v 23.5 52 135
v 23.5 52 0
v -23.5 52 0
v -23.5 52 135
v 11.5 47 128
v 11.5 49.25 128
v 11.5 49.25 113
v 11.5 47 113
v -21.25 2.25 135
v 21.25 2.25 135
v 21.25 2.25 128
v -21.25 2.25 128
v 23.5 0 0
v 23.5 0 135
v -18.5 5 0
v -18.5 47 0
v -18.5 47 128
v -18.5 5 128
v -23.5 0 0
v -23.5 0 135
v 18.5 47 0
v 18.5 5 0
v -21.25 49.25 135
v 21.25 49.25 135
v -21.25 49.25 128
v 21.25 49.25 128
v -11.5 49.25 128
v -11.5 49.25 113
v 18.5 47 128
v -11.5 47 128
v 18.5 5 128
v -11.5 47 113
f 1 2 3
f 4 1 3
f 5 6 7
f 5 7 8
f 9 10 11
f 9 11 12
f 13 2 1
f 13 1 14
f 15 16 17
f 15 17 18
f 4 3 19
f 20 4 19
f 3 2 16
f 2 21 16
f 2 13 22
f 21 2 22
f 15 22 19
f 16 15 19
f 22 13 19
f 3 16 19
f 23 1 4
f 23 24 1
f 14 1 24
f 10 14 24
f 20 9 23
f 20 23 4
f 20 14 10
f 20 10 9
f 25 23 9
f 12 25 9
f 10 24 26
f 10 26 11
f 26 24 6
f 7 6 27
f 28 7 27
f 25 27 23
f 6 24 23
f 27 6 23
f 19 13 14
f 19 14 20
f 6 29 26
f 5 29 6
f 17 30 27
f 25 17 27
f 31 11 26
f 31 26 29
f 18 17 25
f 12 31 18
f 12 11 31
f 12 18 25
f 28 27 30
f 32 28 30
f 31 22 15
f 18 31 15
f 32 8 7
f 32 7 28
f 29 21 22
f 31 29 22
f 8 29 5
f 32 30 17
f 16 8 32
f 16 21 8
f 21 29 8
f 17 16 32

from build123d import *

# Parameters (mm, degrees)
SKETCH119_W             = 47
SKETCH119_H             = 52
SKETCH119_W_2           = 37
SKETCH119_H_2           = 42
PAD060_DEPTH            = 135
SKETCH120_W             = 42.5
SKETCH120_H             = 47
POCKET051_DEPTH         = 7
SKETCH118_W             = 23
SKETCH118_H             = 2.25
POCKET052_DEPTH         = 15
BODY033_PLACEMENT_ANGLE = 180


with BuildPart() as part:
    # Sketch119 → Pad060 (new body)
    with BuildSketch(Plane.XY):
        with Locations((0, -26)):
            Rectangle(SKETCH119_W, SKETCH119_H)
        with Locations((0, -26)):
            Rectangle(SKETCH119_W_2, SKETCH119_H_2, mode=Mode.SUBTRACT)
    extrude(amount=PAD060_DEPTH)

    # Sketch120 (on Face10 of Pad060) → Pocket051 (cut)
    with BuildSketch(Plane.XY.offset(135)):
        with Locations((0, -25.75)):
            Rectangle(SKETCH120_W, SKETCH120_H)
    extrude(amount=-POCKET051_DEPTH, mode=Mode.SUBTRACT)

    # Sketch118 (on Face15 of Pocket051) → Pocket052 (cut)
    with BuildSketch(Plane.XY.offset(128)):
        with Locations((0, -48.125)):
            Rectangle(SKETCH118_W, SKETCH118_H)
    extrude(amount=-POCKET052_DEPTH, mode=Mode.SUBTRACT)


with BuildPart() as part_1:
    # Body033 placement: moved
    add(part.part.rotate(Axis((0, 0, 0), (0, 0, 1)), BODY033_PLACEMENT_ANGLE))


solid = part_1.part
